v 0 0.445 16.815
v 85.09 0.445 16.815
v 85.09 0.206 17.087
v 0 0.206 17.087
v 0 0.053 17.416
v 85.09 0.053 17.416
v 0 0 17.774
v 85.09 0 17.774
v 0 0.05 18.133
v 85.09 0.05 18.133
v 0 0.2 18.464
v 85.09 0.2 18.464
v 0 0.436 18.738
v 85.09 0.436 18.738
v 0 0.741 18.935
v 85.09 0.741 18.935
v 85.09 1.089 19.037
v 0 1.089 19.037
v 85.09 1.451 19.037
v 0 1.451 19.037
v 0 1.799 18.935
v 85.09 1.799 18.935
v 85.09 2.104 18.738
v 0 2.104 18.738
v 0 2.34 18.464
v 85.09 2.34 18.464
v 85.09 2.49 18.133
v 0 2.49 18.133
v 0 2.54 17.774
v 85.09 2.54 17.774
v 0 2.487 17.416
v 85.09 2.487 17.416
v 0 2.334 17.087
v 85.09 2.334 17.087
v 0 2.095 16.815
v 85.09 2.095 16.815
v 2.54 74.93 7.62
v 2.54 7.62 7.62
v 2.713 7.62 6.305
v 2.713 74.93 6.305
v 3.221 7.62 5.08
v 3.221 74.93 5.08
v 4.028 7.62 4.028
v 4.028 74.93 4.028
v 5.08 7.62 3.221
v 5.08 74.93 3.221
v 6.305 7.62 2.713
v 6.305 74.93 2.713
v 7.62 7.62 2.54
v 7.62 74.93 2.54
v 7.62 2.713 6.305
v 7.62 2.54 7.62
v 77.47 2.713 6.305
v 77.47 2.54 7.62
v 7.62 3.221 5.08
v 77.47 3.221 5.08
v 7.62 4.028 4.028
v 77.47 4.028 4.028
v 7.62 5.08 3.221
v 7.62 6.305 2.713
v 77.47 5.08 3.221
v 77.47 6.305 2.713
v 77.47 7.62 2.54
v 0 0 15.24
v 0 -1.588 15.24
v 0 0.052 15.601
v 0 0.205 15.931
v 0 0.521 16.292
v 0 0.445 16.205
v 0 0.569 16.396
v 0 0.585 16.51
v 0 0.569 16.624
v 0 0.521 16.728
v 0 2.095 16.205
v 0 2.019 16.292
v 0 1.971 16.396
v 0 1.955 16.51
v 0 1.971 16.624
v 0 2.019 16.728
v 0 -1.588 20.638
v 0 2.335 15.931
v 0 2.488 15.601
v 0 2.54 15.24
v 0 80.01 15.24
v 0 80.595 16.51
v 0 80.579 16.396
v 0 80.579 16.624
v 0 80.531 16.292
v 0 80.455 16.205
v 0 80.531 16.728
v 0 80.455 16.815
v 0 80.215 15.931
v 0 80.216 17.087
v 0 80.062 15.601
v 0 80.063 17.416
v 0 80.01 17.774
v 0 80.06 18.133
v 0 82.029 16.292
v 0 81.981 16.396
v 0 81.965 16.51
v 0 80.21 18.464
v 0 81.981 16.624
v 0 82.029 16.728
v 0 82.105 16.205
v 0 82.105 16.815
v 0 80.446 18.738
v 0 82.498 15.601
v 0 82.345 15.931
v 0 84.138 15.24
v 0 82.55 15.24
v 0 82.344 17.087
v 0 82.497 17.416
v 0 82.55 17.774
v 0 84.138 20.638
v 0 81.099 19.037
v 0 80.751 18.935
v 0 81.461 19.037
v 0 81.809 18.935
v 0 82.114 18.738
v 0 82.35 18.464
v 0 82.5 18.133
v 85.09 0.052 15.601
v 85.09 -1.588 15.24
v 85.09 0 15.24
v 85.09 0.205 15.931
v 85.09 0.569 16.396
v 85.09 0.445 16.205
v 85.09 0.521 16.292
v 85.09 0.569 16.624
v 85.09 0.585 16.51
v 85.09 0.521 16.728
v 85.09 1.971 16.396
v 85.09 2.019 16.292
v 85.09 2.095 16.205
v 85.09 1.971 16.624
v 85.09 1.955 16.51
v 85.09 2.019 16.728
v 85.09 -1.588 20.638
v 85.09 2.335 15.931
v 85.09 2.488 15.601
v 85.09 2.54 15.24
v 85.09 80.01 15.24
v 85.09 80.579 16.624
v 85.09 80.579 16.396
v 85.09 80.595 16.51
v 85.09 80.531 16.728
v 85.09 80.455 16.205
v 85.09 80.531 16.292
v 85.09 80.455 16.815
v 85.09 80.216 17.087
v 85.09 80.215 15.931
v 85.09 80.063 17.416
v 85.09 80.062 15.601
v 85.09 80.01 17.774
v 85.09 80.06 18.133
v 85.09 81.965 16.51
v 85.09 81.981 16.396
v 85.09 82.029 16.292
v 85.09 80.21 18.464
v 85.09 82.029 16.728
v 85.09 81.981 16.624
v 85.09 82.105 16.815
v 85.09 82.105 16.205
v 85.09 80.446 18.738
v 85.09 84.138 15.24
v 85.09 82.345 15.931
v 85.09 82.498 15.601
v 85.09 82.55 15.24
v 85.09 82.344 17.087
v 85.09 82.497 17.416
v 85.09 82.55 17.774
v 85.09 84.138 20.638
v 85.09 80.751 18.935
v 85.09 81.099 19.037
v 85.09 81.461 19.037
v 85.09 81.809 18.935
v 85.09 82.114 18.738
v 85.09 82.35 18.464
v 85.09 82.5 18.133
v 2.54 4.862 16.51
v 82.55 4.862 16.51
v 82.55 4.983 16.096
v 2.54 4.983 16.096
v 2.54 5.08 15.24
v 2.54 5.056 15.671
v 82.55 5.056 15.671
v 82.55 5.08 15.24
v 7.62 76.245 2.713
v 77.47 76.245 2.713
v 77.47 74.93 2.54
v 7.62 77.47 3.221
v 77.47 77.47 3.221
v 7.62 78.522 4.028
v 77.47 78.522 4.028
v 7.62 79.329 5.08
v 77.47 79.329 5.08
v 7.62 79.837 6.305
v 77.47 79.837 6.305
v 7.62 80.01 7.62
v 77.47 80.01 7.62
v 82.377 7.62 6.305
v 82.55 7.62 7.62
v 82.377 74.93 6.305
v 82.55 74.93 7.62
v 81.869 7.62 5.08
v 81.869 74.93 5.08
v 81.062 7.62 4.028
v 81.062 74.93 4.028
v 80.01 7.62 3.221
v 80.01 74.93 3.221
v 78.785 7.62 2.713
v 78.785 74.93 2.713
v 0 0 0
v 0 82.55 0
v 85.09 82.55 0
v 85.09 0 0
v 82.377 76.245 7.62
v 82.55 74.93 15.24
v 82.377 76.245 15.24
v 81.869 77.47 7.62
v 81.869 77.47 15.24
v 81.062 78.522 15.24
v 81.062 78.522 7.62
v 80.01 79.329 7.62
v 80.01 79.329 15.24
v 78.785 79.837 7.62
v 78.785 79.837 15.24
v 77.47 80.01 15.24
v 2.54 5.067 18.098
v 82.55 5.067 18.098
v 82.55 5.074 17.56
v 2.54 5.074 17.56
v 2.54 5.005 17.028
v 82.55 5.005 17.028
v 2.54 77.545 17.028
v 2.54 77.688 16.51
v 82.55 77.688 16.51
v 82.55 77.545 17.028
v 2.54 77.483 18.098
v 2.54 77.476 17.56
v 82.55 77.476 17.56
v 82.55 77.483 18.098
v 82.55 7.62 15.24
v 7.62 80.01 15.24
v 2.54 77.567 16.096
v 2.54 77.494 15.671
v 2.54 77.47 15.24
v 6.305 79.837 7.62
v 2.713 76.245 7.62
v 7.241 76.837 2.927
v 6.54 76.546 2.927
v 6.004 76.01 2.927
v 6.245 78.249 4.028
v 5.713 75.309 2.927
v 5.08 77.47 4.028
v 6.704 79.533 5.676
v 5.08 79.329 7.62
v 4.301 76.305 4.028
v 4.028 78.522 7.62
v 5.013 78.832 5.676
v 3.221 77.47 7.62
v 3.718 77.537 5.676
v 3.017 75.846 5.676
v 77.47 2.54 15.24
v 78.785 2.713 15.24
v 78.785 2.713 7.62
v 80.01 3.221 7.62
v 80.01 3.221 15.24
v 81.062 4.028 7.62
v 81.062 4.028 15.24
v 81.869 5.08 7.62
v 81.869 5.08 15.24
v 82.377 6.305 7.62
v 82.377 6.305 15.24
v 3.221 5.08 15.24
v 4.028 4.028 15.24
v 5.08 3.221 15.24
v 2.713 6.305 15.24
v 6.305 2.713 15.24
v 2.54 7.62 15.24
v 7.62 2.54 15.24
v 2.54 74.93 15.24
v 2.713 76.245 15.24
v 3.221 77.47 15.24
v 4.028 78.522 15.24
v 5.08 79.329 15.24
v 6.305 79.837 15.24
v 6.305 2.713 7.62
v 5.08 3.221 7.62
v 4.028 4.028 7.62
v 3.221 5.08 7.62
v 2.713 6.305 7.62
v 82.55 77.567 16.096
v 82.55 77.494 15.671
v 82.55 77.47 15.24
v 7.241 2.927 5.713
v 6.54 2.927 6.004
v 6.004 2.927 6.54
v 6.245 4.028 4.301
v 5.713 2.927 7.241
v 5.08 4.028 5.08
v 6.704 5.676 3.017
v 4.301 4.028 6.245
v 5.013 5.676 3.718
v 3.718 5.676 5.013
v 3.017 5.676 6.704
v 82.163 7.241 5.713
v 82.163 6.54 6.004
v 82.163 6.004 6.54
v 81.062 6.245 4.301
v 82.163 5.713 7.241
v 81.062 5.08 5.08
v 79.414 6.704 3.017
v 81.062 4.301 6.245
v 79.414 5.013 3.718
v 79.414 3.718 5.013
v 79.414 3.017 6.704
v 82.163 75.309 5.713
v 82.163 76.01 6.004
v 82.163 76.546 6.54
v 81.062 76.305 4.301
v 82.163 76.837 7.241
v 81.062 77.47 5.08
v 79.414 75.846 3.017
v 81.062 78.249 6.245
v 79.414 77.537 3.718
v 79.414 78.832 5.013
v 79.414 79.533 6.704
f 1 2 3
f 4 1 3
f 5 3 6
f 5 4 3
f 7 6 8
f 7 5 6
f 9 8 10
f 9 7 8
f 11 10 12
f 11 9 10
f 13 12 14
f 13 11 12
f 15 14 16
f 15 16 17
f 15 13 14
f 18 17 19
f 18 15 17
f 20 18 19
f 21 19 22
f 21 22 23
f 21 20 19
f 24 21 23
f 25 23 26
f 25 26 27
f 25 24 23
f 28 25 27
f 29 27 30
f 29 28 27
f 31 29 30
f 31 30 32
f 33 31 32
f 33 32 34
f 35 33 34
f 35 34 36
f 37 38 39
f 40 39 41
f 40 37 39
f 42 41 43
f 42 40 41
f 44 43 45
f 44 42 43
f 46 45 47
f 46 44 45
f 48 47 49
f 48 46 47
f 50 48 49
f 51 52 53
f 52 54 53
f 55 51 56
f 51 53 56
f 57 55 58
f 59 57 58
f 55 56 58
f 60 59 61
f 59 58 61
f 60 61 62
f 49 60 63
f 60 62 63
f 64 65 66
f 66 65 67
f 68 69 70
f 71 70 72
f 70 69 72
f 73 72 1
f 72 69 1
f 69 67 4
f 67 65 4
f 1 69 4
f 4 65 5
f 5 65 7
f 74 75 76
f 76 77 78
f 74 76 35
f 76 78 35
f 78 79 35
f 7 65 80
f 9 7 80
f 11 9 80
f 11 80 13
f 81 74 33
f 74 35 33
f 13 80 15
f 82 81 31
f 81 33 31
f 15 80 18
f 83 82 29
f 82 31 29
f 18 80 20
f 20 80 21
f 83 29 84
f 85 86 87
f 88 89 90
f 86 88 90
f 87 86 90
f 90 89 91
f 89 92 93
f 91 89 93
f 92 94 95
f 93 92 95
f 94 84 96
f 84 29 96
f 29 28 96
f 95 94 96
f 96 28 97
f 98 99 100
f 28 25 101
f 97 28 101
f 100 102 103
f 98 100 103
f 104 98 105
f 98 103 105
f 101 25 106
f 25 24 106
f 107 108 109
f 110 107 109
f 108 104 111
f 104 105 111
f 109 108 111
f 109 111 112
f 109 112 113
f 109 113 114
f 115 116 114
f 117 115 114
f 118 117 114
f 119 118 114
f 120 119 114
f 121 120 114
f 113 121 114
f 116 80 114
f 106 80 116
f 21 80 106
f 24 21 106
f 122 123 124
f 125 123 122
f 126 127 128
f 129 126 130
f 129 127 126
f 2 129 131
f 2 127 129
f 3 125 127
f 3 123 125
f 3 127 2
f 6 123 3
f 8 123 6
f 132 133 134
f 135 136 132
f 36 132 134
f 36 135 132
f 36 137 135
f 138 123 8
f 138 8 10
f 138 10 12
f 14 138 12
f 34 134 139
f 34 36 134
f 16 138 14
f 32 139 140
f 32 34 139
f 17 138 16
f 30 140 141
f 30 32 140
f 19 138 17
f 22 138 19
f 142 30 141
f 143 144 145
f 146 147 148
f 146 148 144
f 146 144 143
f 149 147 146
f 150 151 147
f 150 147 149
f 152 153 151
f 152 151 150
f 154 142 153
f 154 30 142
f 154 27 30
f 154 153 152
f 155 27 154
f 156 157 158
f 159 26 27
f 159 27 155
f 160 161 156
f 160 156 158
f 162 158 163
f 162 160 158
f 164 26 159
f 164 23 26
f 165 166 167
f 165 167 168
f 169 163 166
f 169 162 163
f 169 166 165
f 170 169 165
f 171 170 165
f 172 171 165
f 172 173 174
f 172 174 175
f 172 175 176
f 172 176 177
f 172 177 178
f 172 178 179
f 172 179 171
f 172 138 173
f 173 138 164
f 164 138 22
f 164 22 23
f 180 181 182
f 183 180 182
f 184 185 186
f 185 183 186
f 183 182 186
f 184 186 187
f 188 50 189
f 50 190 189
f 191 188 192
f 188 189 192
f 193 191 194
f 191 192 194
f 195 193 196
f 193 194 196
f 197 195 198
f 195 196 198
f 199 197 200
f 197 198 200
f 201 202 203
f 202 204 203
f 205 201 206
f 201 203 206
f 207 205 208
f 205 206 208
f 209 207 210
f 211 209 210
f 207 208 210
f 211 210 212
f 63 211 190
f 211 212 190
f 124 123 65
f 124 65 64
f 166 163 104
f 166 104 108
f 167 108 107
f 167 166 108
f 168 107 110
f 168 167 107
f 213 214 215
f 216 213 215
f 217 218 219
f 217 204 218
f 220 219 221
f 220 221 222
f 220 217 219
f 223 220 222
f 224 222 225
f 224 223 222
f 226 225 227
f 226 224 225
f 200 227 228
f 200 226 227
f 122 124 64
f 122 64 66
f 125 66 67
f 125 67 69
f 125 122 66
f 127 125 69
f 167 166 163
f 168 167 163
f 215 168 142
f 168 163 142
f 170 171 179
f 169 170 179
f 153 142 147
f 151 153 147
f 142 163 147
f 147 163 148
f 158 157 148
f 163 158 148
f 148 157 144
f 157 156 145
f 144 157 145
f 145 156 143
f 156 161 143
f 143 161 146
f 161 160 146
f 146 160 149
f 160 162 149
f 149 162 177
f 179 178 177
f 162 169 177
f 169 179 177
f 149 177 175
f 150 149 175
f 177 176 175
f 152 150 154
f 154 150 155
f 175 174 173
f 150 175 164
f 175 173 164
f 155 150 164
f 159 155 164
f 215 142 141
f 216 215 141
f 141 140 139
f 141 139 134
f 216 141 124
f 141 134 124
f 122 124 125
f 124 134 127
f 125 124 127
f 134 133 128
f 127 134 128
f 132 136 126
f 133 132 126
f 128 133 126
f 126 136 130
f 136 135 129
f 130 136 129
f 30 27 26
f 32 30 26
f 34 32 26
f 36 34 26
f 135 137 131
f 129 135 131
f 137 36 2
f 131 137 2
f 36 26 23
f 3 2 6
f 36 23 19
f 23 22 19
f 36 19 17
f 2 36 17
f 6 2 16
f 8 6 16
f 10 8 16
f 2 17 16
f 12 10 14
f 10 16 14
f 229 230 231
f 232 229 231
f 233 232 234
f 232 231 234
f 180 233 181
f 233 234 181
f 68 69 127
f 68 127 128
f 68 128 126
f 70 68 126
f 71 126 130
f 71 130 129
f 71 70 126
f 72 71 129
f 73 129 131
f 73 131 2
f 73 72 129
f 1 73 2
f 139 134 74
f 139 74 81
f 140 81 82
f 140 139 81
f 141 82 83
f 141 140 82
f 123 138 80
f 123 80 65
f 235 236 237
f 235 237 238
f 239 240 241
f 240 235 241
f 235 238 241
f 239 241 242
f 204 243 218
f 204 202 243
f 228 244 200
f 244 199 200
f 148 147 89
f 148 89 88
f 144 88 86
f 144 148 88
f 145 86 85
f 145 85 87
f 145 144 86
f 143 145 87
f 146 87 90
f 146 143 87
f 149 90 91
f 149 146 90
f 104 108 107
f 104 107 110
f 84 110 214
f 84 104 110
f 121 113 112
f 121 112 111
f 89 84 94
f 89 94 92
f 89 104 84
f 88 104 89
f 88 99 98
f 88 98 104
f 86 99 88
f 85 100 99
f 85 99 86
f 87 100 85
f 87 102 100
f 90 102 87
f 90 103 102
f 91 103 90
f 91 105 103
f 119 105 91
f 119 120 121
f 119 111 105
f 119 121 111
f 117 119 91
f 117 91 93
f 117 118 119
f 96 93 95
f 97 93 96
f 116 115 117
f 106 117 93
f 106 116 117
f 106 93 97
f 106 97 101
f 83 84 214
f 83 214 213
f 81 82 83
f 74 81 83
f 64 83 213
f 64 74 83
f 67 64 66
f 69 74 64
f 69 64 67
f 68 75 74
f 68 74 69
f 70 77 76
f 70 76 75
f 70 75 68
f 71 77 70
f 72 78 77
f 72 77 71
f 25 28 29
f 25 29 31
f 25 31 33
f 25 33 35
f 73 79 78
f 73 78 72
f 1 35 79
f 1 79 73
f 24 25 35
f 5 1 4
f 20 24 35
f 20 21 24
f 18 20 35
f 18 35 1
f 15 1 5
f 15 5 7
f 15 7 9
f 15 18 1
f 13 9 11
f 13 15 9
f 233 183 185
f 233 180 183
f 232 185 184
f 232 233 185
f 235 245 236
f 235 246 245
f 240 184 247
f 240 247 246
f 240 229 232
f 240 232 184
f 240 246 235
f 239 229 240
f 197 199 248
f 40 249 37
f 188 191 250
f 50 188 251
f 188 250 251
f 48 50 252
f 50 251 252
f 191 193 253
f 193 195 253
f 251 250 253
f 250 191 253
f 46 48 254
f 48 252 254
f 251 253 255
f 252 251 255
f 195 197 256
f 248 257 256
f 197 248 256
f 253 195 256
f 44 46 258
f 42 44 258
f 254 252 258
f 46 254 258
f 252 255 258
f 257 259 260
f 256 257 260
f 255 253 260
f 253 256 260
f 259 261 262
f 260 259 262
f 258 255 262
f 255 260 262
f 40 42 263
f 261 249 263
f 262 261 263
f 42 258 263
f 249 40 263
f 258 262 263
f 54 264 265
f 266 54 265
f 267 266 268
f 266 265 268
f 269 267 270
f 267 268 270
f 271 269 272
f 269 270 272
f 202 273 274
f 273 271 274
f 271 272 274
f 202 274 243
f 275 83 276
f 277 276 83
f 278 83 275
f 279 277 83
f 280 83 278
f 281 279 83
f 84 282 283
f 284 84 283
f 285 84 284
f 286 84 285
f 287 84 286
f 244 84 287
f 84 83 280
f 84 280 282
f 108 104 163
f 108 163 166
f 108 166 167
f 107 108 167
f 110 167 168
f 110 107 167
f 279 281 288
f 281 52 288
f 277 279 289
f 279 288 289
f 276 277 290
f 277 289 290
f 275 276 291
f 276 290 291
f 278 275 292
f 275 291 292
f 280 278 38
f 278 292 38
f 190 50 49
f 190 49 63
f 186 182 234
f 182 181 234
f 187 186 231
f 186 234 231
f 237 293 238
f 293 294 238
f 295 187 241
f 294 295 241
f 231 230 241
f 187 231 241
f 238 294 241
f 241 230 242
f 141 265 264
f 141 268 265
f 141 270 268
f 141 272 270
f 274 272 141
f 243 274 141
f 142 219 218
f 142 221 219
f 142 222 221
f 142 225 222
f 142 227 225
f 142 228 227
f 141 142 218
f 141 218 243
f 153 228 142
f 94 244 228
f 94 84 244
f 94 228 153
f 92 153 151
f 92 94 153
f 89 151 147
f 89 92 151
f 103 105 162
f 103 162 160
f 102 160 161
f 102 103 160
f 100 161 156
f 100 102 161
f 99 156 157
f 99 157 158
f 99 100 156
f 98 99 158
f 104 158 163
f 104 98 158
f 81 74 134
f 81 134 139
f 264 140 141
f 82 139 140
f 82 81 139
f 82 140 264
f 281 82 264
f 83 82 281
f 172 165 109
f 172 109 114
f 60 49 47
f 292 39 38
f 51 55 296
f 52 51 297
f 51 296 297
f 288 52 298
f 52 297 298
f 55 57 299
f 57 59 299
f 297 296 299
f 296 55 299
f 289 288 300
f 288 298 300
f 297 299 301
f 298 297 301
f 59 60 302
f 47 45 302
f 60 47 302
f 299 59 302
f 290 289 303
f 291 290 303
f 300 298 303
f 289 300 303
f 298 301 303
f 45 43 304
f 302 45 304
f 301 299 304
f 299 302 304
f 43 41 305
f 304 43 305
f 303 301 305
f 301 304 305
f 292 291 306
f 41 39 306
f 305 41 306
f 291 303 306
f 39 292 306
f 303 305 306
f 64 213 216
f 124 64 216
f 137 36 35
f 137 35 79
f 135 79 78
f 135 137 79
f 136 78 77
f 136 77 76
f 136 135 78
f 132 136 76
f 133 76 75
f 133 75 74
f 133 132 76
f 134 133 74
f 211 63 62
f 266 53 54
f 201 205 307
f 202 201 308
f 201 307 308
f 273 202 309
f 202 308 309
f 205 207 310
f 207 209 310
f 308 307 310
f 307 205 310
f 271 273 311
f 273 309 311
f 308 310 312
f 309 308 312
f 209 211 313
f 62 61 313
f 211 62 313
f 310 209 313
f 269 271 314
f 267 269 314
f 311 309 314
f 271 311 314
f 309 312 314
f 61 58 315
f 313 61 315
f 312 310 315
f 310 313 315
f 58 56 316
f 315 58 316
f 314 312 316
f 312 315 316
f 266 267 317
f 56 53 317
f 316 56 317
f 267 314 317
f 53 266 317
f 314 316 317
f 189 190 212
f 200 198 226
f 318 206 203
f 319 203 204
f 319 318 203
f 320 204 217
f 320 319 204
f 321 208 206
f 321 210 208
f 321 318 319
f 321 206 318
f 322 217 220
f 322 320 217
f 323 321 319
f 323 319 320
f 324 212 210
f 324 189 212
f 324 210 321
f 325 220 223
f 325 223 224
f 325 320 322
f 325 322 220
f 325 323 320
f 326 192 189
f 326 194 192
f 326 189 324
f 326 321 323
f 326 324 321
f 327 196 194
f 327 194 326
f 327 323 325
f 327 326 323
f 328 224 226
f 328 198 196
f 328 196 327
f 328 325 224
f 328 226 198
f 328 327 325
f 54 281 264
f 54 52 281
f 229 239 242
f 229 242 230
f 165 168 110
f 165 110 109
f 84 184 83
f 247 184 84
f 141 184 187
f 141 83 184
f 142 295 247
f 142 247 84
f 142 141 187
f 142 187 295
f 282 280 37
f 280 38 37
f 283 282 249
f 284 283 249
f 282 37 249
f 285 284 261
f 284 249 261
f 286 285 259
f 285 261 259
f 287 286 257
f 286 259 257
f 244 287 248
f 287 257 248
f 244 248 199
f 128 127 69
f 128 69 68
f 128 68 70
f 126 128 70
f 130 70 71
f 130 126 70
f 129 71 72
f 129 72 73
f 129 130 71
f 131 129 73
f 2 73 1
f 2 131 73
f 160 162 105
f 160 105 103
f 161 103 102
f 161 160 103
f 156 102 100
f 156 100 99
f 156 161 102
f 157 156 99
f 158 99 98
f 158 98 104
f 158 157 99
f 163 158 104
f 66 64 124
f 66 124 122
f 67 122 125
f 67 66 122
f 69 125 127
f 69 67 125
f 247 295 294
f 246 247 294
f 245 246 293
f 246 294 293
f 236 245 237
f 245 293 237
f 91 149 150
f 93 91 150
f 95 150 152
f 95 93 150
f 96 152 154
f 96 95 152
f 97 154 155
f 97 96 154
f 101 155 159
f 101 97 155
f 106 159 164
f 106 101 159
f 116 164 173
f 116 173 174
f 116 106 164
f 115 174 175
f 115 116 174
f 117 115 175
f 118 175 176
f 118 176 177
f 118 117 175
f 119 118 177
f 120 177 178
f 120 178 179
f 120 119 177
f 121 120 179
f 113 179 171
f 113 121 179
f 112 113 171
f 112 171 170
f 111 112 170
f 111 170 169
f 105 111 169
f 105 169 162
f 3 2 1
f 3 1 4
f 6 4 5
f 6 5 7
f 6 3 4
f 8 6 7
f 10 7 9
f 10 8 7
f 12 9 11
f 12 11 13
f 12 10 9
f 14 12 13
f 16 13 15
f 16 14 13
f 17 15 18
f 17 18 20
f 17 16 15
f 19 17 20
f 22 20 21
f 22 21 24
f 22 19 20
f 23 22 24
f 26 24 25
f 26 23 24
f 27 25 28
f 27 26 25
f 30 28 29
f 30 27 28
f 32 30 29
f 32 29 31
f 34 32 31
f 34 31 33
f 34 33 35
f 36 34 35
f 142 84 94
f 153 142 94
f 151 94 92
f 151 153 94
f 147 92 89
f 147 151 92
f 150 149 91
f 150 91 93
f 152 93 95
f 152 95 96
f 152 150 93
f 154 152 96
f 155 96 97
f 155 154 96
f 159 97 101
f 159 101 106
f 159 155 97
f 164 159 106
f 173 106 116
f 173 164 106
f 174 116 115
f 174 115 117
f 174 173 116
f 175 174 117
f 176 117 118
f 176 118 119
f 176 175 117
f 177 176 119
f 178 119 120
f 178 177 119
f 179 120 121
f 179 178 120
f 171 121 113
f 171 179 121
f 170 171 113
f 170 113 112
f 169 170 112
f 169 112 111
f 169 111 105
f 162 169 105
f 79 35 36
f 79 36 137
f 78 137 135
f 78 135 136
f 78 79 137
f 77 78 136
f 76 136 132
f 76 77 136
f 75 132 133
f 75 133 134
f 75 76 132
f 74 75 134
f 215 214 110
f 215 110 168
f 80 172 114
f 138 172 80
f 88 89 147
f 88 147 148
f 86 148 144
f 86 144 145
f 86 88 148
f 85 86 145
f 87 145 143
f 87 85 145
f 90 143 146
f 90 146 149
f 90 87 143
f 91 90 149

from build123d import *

# Parameters (mm, degrees)
F0_W     = 85.09
F0_H     = 82.55
F1_DEPTH = 15.24
F2_T     = -2.54
F4_DEPTH = 85.09
F7_DEPTH = 85.09
F8_T     = -2.54
F9_R     = 5.08


with BuildPart() as f1:
    # F0 (on Top) → F1 (new body)
    with BuildSketch(Plane.XY):
        with Locations((42.545, 41.275)):
            Rectangle(F0_W, F0_H)
    extrude(amount=F1_DEPTH)

    # F2
    f2_openings = [f1.faces().sort_by_distance(p)[0] for p in [
        (42.545, 41.275, 15.24),
    ]]
    offset(amount=F2_T, openings=f2_openings)

    # F3 (on face) → F4 (join, through all)
    with BuildSketch(Plane(origin=(0, 0, 0), x_dir=(0, -1, 0), z_dir=(-1, 0, 0))):
        with BuildLine():
            Line((-2.54, 15.24), (0, 15.24))
            ThreePointArc((0, 15.24), (-0.1165531164, 15.7714699302), (-0.4448193492, 16.2053895035))
            ThreePointArc((-0.4448193492, 16.2053895035), (-0.5851737267, 16.51), (-0.4448193492, 16.8146104965))
            ThreePointArc((-0.4448193492, 16.8146104965), (-1.27, 19.05), (-2.0951806508, 16.8146104965))
            ThreePointArc((-2.0951806508, 16.8146104965), (-1.9548262733, 16.51), (-2.0951806508, 16.2053895035))
            ThreePointArc((-2.0951806508, 16.2053895035), (-2.4234468836, 15.7714699302), (-2.54, 15.24))
        make_face()
        with BuildLine():
            ThreePointArc((-82.1051806508, 16.8146104965), (-81.9648262733, 16.51), (-82.1051806508, 16.2053895035))
            ThreePointArc((-82.1051806508, 16.2053895035), (-82.4334468836, 15.7714699302), (-82.55, 15.24))
            Line((-82.55, 15.24), (-80.01, 15.24))
            ThreePointArc((-80.01, 15.24), (-80.1265531164, 15.7714699302), (-80.4548193492, 16.2053895035))
            ThreePointArc((-80.4548193492, 16.2053895035), (-80.5951737267, 16.51), (-80.4548193492, 16.8146104965))
            ThreePointArc((-80.4548193492, 16.8146104965), (-81.28, 19.05), (-82.1051806508, 16.8146104965))
        make_face()
    extrude(amount=-F4_DEPTH)

    # F9
    f9_edges = [f1.edges().sort_by_distance(p)[0] for p in [
        (2.54, 80.01, 8.89),
        (42.545, 80.01, 2.54),
        (2.54, 41.275, 2.54),
        (42.545, 2.54, 2.54),
        (82.55, 41.275, 2.54),
        (2.54, 2.54, 8.89),
        (82.55, 2.54, 8.89),
        (82.55, 80.01, 8.89),
    ]]
    fillet(f9_edges, radius=F9_R)


with BuildPart() as f7:
    # F6 (on face) → F7 (new body, through all)
    with BuildSketch(Plane.YZ.offset(85.09)):
        with BuildLine():
            ThreePointArc((2.0951806508, 16.2053895035), (2.4234468836, 15.7714699302), (2.54, 15.24))
            Line((2.54, 15.24), (80.01, 15.24))
            ThreePointArc((80.01, 15.24), (80.1265531164, 15.7714699302), (80.4548193492, 16.2053895035))
            ThreePointArc((80.4548193492, 16.2053895035), (80.5951737267, 16.51), (80.4548193492, 16.8146104965))
            ThreePointArc((80.4548193492, 16.8146104965), (81.28, 19.05), (82.1051806508, 16.8146104965))
            ThreePointArc((82.1051806508, 16.8146104965), (81.9648262733, 16.51), (82.1051806508, 16.2053895035))
            ThreePointArc((82.1051806508, 16.2053895035), (82.4334468836, 15.7714699302), (82.55, 15.24))
            Line((82.55, 15.24), (84.1375, 15.24))
            Line((84.1375, 15.24), (84.1375, 20.6375))
            Line((84.1375, 20.6375), (-1.5875, 20.6375))
            Line((-1.5875, 20.6375), (-1.5875, 15.24))
            Line((-1.5875, 15.24), (0, 15.24))
            ThreePointArc((0, 15.24), (0.1165531164, 15.7714699302), (0.4448193492, 16.2053895035))
            ThreePointArc((0.4448193492, 16.2053895035), (0.5851737267, 16.51), (0.4448193492, 16.8146104965))
            ThreePointArc((0.4448193492, 16.8146104965), (1.27, 19.05), (2.0951806508, 16.8146104965))
            ThreePointArc((2.0951806508, 16.8146104965), (1.9548262733, 16.51), (2.0951806508, 16.2053895035))
        make_face()
    extrude(amount=-F7_DEPTH)

    # F8
    f8_openings = [f7.faces().sort_by_distance(p)[0] for p in [
        (42.545, 41.275, 15.24),
    ]]
    offset(amount=F8_T, openings=f8_openings)


solid = Compound([f1.part, f7.part])
